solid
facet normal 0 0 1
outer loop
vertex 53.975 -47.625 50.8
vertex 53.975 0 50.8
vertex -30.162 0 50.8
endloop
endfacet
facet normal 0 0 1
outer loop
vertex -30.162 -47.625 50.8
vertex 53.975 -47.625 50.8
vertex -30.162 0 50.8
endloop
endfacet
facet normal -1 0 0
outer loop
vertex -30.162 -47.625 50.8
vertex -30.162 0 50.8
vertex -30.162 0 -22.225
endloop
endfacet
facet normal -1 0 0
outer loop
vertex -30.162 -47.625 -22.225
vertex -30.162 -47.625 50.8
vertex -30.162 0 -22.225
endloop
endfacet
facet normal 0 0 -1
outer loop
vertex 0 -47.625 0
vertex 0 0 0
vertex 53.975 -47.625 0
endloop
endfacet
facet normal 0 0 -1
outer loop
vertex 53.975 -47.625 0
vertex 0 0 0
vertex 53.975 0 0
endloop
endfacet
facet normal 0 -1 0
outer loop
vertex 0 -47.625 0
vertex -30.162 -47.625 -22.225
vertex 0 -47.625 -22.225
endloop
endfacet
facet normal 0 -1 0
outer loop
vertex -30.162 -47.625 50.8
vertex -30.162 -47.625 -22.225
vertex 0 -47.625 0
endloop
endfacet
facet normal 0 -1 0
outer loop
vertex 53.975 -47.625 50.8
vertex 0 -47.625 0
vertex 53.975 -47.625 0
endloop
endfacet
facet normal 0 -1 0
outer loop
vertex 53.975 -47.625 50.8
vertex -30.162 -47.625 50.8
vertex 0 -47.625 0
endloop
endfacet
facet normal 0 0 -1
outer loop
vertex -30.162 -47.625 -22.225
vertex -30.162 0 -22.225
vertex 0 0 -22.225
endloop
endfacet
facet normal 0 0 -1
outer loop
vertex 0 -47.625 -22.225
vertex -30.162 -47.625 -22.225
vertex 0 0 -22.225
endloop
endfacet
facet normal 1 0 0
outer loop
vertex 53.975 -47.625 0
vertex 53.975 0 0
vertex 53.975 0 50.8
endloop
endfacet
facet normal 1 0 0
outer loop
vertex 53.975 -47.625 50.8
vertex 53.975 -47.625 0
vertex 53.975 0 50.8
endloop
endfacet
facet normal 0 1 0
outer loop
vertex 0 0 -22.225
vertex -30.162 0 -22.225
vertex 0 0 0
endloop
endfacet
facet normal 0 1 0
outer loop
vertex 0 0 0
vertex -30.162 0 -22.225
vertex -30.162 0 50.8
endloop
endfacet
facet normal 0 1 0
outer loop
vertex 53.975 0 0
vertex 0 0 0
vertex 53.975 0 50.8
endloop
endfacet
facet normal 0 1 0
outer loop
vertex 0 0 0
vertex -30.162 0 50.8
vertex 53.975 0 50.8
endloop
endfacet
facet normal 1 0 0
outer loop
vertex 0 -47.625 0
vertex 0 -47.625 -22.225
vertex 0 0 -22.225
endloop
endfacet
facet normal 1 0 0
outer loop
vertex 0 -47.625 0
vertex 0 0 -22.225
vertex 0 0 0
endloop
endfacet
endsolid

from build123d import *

# Parameters (mm, degrees)
F0_W     = 53.975
F0_H     = 50.8
F1_DEPTH = 47.625
F2_DEPTH = 47.625


with BuildPart() as f1:
    # F0 (on Front) → F1 (new body)
    with BuildSketch(Plane.XZ):
        with Locations((26.9875, 25.4)):
            Rectangle(F0_W, F0_H)
    extrude(amount=F1_DEPTH)

    # F0 (on Front) → F2 (join, through all)
    with BuildSketch(Plane.XZ):
        Polygon((0, 50.8), (-30.1625, 50.8), (-30.1625, -22.225), (0, -22.225), (0, 0), align=None)
    extrude(amount=F2_DEPTH)


solid = f1.part
